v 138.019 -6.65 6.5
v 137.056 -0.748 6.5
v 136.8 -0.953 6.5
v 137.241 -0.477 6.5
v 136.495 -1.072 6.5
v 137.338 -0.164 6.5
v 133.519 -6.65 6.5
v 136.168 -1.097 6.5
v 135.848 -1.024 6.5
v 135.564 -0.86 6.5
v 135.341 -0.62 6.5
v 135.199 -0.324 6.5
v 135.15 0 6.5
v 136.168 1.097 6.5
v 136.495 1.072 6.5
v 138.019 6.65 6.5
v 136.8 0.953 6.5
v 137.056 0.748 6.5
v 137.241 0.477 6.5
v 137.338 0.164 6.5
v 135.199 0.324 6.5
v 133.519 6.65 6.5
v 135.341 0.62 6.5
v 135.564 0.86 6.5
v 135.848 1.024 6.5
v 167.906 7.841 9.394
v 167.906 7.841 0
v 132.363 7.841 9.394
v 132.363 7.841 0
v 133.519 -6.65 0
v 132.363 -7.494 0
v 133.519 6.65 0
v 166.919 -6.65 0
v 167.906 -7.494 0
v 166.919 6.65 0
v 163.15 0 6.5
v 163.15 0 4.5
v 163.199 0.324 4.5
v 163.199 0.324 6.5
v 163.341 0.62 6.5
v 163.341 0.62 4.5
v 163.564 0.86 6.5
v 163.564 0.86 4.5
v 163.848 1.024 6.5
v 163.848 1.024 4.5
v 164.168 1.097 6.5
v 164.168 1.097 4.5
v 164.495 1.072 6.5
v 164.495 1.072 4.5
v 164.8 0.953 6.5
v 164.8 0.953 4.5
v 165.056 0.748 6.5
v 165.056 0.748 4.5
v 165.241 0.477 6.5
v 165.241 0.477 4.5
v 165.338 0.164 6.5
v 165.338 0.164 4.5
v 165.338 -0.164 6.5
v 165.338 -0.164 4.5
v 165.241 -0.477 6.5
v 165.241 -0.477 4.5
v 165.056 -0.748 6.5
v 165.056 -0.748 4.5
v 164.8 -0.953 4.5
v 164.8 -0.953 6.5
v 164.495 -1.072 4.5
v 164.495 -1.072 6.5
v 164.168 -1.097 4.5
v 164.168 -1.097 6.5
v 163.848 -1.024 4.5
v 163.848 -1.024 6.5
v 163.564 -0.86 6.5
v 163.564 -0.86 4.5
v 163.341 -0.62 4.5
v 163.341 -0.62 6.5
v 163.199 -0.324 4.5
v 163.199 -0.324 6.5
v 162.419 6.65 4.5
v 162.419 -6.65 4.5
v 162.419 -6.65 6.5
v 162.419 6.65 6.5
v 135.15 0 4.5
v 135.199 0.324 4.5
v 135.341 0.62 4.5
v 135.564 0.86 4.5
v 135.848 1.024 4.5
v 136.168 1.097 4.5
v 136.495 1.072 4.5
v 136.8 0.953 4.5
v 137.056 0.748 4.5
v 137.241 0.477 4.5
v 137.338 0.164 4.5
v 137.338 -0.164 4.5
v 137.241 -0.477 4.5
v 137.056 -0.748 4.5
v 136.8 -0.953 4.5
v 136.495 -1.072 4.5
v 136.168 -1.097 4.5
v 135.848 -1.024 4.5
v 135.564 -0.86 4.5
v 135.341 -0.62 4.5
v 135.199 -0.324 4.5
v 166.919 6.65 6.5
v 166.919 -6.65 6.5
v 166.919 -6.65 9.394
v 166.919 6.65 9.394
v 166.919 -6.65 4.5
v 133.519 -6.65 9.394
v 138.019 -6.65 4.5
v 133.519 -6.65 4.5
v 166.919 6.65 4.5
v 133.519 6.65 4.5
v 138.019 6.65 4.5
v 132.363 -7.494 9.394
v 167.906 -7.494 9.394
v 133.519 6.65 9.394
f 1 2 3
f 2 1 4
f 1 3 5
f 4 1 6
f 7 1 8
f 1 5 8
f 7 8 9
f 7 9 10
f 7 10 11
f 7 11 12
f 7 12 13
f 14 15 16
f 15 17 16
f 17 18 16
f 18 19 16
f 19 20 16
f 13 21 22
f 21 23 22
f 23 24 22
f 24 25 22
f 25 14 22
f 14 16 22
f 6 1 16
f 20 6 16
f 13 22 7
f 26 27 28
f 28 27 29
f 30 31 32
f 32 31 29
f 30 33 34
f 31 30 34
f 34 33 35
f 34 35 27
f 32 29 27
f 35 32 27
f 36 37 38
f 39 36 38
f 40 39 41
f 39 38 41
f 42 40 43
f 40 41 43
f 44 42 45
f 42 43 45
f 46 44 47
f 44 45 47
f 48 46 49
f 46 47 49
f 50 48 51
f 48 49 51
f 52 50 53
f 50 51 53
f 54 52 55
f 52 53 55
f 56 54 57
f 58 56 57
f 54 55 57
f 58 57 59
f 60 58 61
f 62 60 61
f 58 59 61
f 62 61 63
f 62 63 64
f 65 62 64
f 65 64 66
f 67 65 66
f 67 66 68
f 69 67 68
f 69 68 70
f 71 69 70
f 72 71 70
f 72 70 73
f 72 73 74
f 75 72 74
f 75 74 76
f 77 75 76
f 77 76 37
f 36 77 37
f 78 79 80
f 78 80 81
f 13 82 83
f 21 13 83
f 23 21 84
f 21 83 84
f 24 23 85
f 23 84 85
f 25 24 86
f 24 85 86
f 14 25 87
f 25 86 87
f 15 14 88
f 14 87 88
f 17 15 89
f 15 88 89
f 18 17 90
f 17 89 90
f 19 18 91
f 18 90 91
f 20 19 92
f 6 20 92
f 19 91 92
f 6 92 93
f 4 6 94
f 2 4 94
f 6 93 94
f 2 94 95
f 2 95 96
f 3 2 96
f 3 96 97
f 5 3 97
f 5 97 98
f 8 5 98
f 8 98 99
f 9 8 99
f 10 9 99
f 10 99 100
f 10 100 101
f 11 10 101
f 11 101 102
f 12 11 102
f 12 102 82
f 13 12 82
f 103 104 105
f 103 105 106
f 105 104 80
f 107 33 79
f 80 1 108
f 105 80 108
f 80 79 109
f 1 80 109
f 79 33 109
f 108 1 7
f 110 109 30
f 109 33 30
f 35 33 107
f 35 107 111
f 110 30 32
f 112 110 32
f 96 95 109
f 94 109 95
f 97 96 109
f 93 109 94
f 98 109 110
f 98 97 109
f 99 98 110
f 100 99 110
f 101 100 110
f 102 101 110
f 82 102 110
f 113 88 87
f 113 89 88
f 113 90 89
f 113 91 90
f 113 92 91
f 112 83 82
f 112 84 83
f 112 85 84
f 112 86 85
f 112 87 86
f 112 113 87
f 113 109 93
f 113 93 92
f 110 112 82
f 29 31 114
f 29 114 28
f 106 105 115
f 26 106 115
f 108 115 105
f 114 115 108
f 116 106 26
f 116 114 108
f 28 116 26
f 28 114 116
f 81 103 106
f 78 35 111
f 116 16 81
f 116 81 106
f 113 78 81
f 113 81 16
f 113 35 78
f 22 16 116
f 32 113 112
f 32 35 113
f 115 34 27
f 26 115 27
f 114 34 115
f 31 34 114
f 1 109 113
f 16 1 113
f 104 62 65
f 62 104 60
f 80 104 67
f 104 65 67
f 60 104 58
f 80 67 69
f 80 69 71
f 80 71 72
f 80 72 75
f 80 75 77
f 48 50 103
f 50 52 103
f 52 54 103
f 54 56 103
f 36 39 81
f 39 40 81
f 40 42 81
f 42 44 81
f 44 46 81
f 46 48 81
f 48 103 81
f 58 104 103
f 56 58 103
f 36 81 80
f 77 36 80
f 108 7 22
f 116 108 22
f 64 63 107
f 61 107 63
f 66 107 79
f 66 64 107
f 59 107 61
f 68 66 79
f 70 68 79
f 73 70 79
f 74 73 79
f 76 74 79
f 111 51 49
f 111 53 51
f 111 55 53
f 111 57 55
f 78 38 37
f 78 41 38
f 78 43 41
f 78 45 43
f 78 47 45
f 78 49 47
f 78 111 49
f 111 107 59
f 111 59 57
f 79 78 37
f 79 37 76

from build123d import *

# Parameters (mm, degrees)
BOSS_EXTRUDE1_DEPTH = 25
SKETCH16_W          = 33.4
SKETCH16_H          = 13.3
CUT_EXTRUDE10_DEPTH = 4.5
SKETCH19_R          = 20
CUT_EXTRUDE14_DEPTH = 5
SKETCH17_W          = 24.4
SKETCH17_H          = 13.3
CUT_EXTRUDE11_DEPTH = 177.45821035
CUT_EXTRUDE13_DEPTH = 6.45
SKETCH20_W          = 33.4
SKETCH20_H          = 13.3
CUT_EXTRUDE15_DEPTH = 176.655202029
SKETCH21_R          = 1.1
CUT_EXTRUDE16_DEPTH = 177.45821035
SKETCH22_R          = 2
CUT_EXTRUDE17_DEPTH = 20
SKETCH23_W          = 35.542805721
SKETCH23_H          = 15.334329657
SKETCH23_R          = 20
CUT_EXTRUDE18_DEPTH = 177.45821035
SKETCH24_W          = 18.060519465
SKETCH24_H          = 23.66068054
CUT_EXTRUDE19_DEPTH = 45.156146987


with BuildPart() as part:
    # Sketch1 → Boss-Extrude1 (new body)
    with BuildSketch(Plane.XY):
        with BuildLine():
            ThreePointArc((172.5, 0), (152.823244805, 26.363741023), (121.951138857, 15))
            Line((121.951138857, 15), (145, 15))
            Line((145, 15), (145, -15))
            Line((145, -15), (121.951138857, -15))
            ThreePointArc((121.951138857, -15), (152.823244805, -26.363741023), (172.5, 0))
        make_face()
        with BuildLine():
            Line((145, 15), (121.951138857, 15))
            ThreePointArc((121.951138857, 15), (117.5, 0), (121.951138857, -15))
            Line((121.951138857, -15), (145, -15))
            Line((145, -15), (145, 15))
        make_face()
        with BuildLine():
            Line((121.951138857, 15), (23.048861143, 15))
            ThreePointArc((23.048861143, 15), (26.363741023, 7.823244805), (27.5, 0))
            ThreePointArc((27.5, 0), (26.363741023, -7.823244805), (23.048861143, -15))
            Line((23.048861143, -15), (121.951138857, -15))
            ThreePointArc((121.951138857, -15), (117.5, 0), (121.951138857, 15))
        make_face()
        with BuildLine():
            ThreePointArc((13.228756555, -15), (-20, 0), (13.228756555, 15))
            Line((13.228756555, 15), (23.048861143, 15))
            ThreePointArc((23.048861143, 15), (-27.5, 0), (23.048861143, -15))
            Line((23.048861143, -15), (13.228756555, -15))
        make_face()
        with BuildLine():
            Line((23.048861143, 15), (13.228756555, 15))
            ThreePointArc((13.228756555, 15), (18.228756555, 8.228756555), (20, 0))
            ThreePointArc((20, 0), (18.228756555, -8.228756555), (13.228756555, -15))
            Line((13.228756555, -15), (23.048861143, -15))
            ThreePointArc((23.048861143, -15), (26.363741023, -7.823244805), (27.5, 0))
            ThreePointArc((27.5, 0), (26.363741023, 7.823244805), (23.048861143, 15))
        make_face()
        with BuildLine():
            Line((0, -15), (0, 15))
            Line((0, 15), (13.228756555, 15))
            ThreePointArc((13.228756555, 15), (-20, 0), (13.228756555, -15))
            Line((13.228756555, -15), (0, -15))
        make_face()
        with BuildLine():
            Line((13.228756555, 15), (0, 15))
            Line((0, 15), (0, -15))
            Line((0, -15), (13.228756555, -15))
            ThreePointArc((13.228756555, -15), (18.228756555, -8.228756555), (20, 0))
            ThreePointArc((20, 0), (18.228756555, 8.228756555), (13.228756555, 15))
        make_face()
    extrude(amount=BOSS_EXTRUDE1_DEPTH)

    # Sketch16 → Cut-Extrude10 (cut)
    with BuildSketch(Plane(origin=(0, 0, 0), x_dir=(-1, 0, 0), z_dir=(0, 0, -1))):
        with Locations((-150.21934279, 0)):
            Rectangle(SKETCH16_W, SKETCH16_H)
    extrude(amount=-CUT_EXTRUDE10_DEPTH, mode=Mode.SUBTRACT)

    # Sketch19 → Cut-Extrude14 (cut)
    with BuildSketch(Plane(origin=(0, 0, 0), x_dir=(-1, 0, 0), z_dir=(0, 0, -1))):
        Circle(SKETCH19_R)
    extrude(amount=-CUT_EXTRUDE14_DEPTH, mode=Mode.SUBTRACT)

    # Sketch17 → Cut-Extrude11 (cut, through all)
    with BuildSketch(Plane(origin=(0, 0, 0), x_dir=(-1, 0, 0), z_dir=(0, 0, -1))):
        with Locations((-150.21934279, 0)):
            Rectangle(SKETCH17_W, SKETCH17_H)
    extrude(amount=-CUT_EXTRUDE11_DEPTH, mode=Mode.SUBTRACT)

    # Sketch18 → Cut-Extrude13 (cut, symmetric)
    with BuildSketch(Plane(origin=(0, 0, 0), x_dir=(-1, 0, 0), z_dir=(0, -1, 0))):
        Polygon((-138.01934279, -15), (-138.01934279, -25), (-122.01934279, -25), (-122.01934279, -22.5), align=None)
    extrude(amount=CUT_EXTRUDE13_DEPTH, both=True, mode=Mode.SUBTRACT)

    # Sketch20 → Cut-Extrude15 (cut, through all)
    with BuildSketch(Plane(origin=(0, 0, 6.5), x_dir=(-1, 0, 0), z_dir=(0, 0, -1))):
        with Locations((-150.21934279, 0)):
            Rectangle(SKETCH20_W, SKETCH20_H)
    extrude(amount=-CUT_EXTRUDE15_DEPTH, mode=Mode.SUBTRACT)

    # Sketch21 → Cut-Extrude16 (cut, through all)
    with BuildSketch(Plane(origin=(0, 0, 0), x_dir=(-1, 0, 0), z_dir=(0, 0, -1))):
        with Locations((-164.249999957, 0)):
            Circle(SKETCH21_R)
        with Locations((-136.249999957, 0)):
            Circle(SKETCH21_R)
    extrude(amount=-CUT_EXTRUDE16_DEPTH, mode=Mode.SUBTRACT)

    # Sketch22 → Cut-Extrude17 (cut)
    with BuildSketch(Plane.XY.offset(25)):
        Circle(SKETCH22_R)
    extrude(amount=-CUT_EXTRUDE17_DEPTH, mode=Mode.SUBTRACT)

    # Sketch23 → Cut-Extrude18 (cut, through all)
    with BuildSketch(Plane(origin=(0, 0, 0), x_dir=(-1, 0, 0), z_dir=(0, 0, -1))):
        with BuildLine():
            ThreePointArc((-121.951138857, 15), (-172.5, 0), (-121.951138857, -15))
            Line((-121.951138857, -15), (-23.048861143, -15))
            ThreePointArc((-23.048861143, -15), (27.5, 0), (-23.048861143, 15))
            Line((-23.048861143, 15), (-121.951138857, 15))
        make_face()
        with Locations((-150.134671958, 0.173388614)):
            Rectangle(SKETCH23_W, SKETCH23_H, mode=Mode.SUBTRACT)
        Circle(SKETCH23_R, mode=Mode.SUBTRACT)
    extrude(amount=-CUT_EXTRUDE18_DEPTH, mode=Mode.SUBTRACT)


with BuildPart() as cut_extrude18_kept_piece:
    # of the separate pieces the step leaves, the one the design keeps (cut_extrude18_pieces_kept)
    add(part.part.solids().sort_by_distance((133.51934279, 6.45, 25))[0])

    # Sketch24 → Cut-Extrude19 (cut, through all)
    with BuildSketch(Plane.ZY.offset(-132.363269097)):
        with Locations((18.423868143, -1.593012334)):
            Rectangle(SKETCH24_W, SKETCH24_H)
    extrude(amount=-CUT_EXTRUDE19_DEPTH, mode=Mode.SUBTRACT)


solid = cut_extrude18_kept_piece.part
